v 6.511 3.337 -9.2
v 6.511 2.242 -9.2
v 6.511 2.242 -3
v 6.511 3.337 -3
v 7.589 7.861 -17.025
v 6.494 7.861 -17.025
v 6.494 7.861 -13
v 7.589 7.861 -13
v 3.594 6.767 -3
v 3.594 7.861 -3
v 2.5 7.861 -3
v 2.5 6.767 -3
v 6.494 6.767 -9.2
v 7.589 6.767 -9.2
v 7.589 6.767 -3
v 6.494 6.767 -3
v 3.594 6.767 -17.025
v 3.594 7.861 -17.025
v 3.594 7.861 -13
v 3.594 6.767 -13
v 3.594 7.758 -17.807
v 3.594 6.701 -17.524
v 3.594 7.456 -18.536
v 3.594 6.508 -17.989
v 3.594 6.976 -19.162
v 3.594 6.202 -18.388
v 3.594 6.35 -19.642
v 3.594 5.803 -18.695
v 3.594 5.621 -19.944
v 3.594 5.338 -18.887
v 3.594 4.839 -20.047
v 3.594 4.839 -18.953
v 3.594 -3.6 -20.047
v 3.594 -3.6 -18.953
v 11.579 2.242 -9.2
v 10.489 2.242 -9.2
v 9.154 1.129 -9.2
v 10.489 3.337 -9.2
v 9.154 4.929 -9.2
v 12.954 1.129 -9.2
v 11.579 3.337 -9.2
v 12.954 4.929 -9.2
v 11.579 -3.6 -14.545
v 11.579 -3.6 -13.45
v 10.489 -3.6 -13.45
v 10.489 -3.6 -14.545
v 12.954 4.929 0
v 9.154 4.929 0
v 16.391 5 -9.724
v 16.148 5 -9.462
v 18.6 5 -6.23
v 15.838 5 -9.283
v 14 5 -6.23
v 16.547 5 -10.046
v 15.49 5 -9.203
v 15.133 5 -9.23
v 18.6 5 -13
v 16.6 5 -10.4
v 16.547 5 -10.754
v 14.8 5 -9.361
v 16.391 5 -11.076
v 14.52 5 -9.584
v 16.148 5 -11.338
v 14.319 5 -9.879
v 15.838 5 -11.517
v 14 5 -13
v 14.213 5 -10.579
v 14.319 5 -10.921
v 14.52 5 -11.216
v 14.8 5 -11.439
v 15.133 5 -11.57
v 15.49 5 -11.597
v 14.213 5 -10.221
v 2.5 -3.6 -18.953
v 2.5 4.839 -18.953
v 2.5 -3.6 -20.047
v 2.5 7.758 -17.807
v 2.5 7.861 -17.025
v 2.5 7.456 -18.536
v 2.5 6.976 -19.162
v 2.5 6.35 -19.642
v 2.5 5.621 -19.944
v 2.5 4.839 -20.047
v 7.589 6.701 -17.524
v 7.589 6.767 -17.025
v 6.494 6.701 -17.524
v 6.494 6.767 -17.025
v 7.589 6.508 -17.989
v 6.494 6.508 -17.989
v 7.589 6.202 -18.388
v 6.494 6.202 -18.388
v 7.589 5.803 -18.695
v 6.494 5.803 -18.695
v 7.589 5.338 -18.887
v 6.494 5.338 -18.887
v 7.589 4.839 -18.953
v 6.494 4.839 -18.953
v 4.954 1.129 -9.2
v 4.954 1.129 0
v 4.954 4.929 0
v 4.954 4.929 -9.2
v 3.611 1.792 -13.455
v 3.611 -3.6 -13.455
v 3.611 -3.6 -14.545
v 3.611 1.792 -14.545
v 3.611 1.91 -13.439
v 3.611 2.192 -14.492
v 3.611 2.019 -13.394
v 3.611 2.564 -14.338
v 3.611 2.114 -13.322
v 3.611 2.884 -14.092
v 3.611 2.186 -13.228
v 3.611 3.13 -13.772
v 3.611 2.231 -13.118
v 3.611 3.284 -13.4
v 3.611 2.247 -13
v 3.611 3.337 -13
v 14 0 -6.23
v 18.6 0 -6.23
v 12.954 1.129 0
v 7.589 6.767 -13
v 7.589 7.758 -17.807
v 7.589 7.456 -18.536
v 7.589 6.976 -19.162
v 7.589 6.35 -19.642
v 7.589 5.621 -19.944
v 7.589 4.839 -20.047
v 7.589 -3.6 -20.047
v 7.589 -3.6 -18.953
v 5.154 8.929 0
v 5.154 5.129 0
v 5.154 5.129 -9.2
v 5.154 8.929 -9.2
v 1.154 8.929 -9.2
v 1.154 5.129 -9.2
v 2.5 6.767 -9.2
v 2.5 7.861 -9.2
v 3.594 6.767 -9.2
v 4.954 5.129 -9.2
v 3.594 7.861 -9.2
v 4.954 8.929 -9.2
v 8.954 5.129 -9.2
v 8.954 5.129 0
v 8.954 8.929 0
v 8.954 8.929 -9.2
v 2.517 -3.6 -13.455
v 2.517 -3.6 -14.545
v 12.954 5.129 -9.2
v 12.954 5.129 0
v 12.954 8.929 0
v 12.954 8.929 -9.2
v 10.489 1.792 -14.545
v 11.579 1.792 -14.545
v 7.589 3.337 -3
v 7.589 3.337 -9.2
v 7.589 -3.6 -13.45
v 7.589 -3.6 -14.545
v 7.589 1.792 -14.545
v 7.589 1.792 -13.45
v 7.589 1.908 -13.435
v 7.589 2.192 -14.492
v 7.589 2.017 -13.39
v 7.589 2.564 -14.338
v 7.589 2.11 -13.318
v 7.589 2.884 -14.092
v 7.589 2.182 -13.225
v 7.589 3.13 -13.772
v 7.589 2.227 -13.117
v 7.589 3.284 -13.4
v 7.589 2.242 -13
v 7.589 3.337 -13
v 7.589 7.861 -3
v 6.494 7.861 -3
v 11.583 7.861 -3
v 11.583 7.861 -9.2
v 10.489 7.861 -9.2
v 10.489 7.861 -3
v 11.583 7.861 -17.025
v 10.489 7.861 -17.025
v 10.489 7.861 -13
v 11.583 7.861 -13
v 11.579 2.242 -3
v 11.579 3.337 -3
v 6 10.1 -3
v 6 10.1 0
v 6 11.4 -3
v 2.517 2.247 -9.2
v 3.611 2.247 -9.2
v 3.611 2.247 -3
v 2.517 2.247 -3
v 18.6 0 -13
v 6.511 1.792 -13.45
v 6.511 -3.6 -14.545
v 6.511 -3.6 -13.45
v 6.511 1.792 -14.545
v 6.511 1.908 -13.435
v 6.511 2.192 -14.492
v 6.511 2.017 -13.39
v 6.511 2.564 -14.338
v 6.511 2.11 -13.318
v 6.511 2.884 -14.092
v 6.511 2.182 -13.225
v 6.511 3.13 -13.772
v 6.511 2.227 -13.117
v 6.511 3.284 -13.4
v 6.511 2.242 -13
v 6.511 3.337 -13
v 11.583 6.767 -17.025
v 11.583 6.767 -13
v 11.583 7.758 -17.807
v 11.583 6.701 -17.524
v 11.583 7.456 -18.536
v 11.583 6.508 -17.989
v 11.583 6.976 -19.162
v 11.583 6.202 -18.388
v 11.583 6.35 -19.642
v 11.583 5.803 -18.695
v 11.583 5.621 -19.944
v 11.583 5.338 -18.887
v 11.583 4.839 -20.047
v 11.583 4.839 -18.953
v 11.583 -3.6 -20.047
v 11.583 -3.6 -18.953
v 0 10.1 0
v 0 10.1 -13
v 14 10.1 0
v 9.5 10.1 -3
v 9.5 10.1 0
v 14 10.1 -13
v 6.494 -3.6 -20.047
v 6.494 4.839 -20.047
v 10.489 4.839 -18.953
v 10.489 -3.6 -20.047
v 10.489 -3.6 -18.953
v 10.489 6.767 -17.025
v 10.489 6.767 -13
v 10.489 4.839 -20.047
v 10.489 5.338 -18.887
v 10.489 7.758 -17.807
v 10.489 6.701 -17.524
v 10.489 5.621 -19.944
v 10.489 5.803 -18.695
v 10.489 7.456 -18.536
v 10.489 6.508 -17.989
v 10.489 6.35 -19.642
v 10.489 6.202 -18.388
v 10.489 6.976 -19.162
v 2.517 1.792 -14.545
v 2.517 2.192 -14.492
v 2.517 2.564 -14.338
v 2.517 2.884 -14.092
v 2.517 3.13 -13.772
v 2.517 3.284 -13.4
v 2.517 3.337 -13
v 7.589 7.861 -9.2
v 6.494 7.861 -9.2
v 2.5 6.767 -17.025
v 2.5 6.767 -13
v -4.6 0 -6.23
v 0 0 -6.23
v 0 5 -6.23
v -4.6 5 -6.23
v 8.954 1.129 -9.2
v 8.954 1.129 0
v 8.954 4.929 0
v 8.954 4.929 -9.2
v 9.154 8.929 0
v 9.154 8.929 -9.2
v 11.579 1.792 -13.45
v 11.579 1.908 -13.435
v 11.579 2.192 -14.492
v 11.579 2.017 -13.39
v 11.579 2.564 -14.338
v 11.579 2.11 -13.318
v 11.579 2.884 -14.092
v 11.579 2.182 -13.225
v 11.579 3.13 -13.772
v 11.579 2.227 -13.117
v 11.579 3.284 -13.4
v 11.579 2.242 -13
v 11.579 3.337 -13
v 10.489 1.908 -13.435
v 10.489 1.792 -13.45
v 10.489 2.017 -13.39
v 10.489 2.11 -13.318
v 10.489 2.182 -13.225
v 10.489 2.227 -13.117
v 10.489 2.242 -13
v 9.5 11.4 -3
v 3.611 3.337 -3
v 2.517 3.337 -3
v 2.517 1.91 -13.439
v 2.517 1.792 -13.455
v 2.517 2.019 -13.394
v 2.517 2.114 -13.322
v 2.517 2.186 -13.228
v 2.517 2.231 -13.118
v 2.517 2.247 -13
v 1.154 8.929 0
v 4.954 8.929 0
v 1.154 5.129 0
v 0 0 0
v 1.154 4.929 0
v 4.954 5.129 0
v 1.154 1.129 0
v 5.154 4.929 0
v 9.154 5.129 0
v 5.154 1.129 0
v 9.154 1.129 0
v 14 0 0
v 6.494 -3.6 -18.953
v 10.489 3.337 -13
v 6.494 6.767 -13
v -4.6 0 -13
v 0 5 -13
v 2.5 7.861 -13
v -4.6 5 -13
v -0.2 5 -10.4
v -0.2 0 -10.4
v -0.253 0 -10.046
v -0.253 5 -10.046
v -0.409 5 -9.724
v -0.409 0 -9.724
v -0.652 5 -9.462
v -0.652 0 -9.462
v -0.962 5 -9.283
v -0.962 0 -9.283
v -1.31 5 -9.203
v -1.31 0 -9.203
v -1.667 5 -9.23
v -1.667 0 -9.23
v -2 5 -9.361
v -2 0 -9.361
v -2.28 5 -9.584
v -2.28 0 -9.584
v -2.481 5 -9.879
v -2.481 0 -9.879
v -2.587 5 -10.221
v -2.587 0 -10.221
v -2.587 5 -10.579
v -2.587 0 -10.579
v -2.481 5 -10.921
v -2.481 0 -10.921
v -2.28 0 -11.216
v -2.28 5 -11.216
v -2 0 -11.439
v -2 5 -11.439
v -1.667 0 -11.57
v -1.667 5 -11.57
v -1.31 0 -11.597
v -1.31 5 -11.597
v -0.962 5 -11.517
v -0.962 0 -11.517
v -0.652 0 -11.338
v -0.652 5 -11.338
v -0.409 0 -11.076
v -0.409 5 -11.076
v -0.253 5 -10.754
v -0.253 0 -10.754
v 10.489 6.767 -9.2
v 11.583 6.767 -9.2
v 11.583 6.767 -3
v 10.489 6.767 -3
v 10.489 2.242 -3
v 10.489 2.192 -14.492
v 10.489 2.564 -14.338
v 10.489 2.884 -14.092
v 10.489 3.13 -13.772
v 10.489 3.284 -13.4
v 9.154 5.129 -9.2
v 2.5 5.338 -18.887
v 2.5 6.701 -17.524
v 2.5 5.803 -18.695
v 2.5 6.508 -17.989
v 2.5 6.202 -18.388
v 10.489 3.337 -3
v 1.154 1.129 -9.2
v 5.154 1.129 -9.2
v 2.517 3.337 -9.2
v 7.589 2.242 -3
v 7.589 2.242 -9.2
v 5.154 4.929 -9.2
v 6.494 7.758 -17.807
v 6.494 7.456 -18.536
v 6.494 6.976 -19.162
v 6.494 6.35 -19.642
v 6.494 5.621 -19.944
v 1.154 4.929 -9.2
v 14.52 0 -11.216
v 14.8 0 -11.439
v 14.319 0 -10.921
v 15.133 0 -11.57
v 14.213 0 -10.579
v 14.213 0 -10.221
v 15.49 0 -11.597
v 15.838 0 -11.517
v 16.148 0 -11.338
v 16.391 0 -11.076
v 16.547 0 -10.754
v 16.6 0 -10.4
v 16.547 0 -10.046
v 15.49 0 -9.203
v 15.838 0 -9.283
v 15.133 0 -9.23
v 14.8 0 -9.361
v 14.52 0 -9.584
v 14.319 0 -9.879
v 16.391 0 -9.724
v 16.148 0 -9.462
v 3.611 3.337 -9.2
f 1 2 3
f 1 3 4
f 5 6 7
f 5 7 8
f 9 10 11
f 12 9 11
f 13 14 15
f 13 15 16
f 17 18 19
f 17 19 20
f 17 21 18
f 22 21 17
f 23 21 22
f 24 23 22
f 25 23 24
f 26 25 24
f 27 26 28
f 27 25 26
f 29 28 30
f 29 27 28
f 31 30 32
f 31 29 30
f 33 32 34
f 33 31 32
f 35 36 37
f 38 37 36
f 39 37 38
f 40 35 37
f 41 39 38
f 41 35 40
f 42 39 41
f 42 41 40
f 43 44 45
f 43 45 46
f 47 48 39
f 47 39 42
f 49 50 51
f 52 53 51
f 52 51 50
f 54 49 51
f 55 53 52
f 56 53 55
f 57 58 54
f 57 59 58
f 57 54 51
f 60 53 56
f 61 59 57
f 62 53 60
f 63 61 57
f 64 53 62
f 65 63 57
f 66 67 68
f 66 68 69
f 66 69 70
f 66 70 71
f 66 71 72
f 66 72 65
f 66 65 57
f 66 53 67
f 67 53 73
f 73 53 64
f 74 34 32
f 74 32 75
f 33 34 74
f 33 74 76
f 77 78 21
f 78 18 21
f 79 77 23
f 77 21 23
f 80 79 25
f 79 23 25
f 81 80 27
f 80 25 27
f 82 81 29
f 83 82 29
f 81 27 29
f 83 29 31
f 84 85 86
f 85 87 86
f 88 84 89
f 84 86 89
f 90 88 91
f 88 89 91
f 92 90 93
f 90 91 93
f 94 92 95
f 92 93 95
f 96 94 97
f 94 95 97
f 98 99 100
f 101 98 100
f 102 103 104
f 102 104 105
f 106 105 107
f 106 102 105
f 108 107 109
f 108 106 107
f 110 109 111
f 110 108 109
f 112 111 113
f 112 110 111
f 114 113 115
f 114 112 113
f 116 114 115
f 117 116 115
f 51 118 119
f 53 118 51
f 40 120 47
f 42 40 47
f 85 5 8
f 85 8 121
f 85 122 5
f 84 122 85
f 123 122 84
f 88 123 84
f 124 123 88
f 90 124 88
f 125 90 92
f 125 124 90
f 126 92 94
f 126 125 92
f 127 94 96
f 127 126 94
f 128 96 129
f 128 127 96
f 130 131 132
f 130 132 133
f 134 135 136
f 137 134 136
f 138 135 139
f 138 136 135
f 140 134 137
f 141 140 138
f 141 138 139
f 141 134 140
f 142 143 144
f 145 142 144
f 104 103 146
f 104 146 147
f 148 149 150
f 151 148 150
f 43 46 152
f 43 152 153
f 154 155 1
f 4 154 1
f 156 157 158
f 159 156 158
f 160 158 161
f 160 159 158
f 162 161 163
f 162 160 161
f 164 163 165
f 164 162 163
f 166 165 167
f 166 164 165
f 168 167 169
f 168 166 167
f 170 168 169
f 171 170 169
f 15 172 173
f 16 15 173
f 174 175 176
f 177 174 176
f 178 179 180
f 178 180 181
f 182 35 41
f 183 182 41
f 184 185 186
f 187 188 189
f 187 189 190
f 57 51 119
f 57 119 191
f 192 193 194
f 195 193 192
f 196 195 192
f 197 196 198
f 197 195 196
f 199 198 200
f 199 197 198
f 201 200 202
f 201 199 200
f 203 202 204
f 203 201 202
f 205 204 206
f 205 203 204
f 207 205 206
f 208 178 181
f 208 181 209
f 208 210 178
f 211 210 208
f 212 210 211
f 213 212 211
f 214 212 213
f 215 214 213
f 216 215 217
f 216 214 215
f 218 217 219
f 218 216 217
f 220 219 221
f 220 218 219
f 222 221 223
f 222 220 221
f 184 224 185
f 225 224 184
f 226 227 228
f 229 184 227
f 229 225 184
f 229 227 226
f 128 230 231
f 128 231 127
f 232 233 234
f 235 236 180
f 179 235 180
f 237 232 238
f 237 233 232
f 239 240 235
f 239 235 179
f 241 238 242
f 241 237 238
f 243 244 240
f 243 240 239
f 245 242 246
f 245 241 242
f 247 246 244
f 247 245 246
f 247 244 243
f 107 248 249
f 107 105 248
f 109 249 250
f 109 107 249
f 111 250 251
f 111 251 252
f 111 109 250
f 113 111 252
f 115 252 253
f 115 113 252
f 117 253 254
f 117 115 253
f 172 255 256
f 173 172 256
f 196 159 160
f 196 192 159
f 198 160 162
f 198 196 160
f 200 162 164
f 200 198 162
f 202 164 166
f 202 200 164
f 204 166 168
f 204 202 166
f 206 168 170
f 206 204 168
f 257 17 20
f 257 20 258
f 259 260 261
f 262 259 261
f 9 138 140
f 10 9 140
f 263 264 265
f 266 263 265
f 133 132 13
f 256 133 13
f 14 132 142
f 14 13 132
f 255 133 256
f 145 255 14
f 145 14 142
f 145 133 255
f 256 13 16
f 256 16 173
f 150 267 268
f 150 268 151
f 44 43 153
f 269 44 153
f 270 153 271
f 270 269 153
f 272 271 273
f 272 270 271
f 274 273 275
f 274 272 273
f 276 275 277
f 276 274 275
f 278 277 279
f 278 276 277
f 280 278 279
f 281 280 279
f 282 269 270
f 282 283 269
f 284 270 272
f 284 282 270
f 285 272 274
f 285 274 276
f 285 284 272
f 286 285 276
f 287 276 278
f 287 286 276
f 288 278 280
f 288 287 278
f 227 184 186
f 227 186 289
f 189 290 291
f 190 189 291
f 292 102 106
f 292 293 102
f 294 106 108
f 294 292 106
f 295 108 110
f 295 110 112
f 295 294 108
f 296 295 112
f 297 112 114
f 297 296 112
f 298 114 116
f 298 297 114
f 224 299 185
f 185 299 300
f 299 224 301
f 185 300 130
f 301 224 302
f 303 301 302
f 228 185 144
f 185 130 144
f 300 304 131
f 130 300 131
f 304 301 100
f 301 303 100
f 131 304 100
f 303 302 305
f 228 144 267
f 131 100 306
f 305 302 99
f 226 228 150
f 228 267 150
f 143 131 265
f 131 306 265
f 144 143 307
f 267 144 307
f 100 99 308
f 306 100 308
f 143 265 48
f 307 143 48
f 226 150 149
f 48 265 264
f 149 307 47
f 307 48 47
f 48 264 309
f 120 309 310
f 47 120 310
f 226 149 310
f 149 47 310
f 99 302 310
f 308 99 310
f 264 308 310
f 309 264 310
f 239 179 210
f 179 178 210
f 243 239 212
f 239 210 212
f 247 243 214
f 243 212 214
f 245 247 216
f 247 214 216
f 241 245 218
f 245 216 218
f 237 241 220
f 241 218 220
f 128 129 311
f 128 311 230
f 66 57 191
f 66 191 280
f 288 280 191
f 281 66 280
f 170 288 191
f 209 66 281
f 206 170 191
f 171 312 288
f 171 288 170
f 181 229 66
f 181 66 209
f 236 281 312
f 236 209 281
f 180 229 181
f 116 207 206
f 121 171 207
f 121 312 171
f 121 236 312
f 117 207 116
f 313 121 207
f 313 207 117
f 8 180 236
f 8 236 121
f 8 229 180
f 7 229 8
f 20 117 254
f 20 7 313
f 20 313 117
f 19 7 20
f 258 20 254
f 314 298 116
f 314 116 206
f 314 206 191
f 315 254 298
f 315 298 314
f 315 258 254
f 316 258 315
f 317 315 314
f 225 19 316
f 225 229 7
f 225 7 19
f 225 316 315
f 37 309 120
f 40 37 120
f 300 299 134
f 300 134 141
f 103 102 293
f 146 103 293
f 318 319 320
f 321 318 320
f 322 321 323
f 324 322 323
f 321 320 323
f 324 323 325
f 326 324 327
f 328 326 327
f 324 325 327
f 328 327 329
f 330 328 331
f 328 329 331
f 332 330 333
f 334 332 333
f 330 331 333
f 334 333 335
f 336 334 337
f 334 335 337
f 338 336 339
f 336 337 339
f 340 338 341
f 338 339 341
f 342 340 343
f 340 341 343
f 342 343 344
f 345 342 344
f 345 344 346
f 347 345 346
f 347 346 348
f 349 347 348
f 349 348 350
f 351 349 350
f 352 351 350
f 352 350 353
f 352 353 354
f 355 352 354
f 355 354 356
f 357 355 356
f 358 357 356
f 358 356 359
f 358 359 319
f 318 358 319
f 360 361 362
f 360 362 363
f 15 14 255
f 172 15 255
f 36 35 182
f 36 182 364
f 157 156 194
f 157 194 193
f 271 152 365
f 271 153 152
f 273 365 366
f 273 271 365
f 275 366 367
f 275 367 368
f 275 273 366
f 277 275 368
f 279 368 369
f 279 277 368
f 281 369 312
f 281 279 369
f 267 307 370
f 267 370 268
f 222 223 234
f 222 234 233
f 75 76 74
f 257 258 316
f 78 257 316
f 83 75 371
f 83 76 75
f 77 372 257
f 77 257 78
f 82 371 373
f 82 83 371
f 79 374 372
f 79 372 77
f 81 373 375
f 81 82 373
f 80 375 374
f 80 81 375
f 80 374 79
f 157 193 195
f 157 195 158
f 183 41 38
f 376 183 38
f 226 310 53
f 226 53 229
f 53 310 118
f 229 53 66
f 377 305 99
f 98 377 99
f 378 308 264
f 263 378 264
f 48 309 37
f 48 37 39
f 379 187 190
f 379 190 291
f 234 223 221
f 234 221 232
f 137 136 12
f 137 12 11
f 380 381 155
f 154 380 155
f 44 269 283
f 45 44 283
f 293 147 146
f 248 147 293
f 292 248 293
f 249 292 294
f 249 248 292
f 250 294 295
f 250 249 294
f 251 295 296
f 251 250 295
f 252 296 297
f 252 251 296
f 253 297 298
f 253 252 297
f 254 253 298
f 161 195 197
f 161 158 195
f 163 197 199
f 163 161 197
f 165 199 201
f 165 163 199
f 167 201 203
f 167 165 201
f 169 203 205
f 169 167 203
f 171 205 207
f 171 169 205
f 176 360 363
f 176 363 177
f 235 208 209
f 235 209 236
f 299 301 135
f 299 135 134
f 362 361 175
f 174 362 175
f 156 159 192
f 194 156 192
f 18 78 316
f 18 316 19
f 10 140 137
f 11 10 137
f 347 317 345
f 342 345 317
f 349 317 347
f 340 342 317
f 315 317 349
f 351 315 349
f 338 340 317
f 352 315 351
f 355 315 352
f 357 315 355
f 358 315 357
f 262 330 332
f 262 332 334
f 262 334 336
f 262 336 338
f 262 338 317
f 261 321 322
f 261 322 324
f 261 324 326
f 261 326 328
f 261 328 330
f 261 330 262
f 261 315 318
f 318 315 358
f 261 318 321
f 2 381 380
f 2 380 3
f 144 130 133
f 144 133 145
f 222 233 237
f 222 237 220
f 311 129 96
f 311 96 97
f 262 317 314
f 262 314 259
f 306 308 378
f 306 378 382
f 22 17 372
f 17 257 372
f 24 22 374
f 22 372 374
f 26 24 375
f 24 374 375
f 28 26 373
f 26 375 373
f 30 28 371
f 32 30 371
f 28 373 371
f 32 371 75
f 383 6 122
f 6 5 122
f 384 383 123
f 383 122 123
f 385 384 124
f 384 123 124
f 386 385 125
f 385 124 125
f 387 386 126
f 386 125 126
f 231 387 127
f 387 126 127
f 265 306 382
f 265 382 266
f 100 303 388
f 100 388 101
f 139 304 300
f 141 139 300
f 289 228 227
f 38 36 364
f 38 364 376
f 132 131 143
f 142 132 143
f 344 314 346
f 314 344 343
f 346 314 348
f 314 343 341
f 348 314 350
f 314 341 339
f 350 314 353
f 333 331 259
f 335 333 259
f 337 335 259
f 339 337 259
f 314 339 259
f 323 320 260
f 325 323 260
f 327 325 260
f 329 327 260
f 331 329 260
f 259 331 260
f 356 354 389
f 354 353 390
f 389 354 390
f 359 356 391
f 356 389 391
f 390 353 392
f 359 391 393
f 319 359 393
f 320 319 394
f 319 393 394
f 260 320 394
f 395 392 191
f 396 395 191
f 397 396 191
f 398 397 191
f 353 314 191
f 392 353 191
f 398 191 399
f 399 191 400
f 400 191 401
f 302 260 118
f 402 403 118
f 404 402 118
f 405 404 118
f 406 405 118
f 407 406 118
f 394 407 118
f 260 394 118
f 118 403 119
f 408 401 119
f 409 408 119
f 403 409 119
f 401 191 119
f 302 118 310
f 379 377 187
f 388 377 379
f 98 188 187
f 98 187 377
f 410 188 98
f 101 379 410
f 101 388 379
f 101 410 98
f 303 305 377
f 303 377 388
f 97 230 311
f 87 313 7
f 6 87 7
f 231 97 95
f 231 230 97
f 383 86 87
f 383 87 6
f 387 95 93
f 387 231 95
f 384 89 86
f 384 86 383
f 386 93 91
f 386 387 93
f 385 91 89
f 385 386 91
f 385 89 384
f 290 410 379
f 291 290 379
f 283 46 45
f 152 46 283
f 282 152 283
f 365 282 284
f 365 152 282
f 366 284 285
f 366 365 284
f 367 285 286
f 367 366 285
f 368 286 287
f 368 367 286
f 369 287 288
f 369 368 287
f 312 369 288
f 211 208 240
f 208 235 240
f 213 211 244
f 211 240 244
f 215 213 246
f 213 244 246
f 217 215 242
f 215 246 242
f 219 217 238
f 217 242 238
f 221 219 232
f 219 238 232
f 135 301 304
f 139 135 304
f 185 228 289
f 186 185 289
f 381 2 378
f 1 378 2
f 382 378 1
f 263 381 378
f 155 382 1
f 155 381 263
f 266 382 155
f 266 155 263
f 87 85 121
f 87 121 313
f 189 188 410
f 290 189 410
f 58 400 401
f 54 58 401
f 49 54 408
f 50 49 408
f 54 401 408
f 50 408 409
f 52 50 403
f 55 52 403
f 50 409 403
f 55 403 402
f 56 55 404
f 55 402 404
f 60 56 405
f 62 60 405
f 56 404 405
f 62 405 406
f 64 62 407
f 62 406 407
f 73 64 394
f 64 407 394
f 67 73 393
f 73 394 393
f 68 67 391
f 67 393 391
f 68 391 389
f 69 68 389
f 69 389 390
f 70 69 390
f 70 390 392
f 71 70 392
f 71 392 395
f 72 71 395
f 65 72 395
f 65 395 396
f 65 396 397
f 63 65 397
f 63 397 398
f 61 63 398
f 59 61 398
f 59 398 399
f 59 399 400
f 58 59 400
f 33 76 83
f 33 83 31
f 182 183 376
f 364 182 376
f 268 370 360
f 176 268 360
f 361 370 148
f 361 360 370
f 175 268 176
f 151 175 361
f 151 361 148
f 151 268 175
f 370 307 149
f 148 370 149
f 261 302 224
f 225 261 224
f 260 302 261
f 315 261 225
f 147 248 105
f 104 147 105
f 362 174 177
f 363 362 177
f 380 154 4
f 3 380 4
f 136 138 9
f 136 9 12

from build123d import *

# Parameters (mm, degrees)
SKETCH1_W           = 14
SKETCH1_H           = 13
BOSS_EXTRUDE1_DEPTH = 10.1
SKETCH2_W           = 3.5
SKETCH2_H           = 3
BOSS_EXTRUDE2_DEPTH = 1.3
CUT_EXTRUDE1_REACH  = 21.728
SKETCH4_W           = 6.77
SKETCH4_H           = 5
BOSS_EXTRUDE3_DEPTH = 4.6
SKETCH5_W           = 6.77
SKETCH5_H           = 5
BOSS_EXTRUDE4_DEPTH = 4.6
SKETCH6_W           = 3.8
SKETCH6_H           = 3.8
CUT_EXTRUDE2_DEPTH  = 9.2
SKETCH7_W           = 1.094306831
SKETCH7_H           = 1.09430683
SKETCH7_W_2         = 1.09430683
BOSS_EXTRUDE5_DEPTH = 10
SKETCH7_4_W         = 1.094306831
SKETCH7_4_H         = 1.09430683
SKETCH7_4_W_2       = 1.09430683
SKETCH10_W          = 1.09430683
SKETCH10_H          = 1.09
SKETCH10_W_2        = 1.077227458
SKETCH10_H_2        = 1.094306831
SKETCH10_W_3        = 1.09
SKETCH10_2_W        = 1.09430683
SKETCH10_2_H        = 1.09
SKETCH10_2_W_2      = 1.077227458
SKETCH10_2_H_2      = 1.094306831
SKETCH10_2_W_3      = 1.09
BOSS_EXTRUDE6_DEPTH = 10
SKETCH12_R          = 1.2
CUT_EXTRUDE3_DEPTH  = 30.627830836


with BuildPart() as part:
    # Sketch1 → Boss-Extrude1 (new body)
    with BuildSketch(Plane(origin=(0, 0, 0), x_dir=(1, 0, 0), z_dir=(0, 1, 0))):
        with Locations((7, 6.5)):
            Rectangle(SKETCH1_W, SKETCH1_H)
    extrude(amount=BOSS_EXTRUDE1_DEPTH)

    # Sketch2 → Boss-Extrude2 (add)
    with BuildSketch(Plane(origin=(0, 10.1, 0), x_dir=(1, 0, 0), z_dir=(0, 1, 0))):
        with Locations((7.75, 1.5)):
            Rectangle(SKETCH2_W, SKETCH2_H)
    extrude(amount=BOSS_EXTRUDE2_DEPTH)

    # Sketch3 → Cut-Extrude1 (cut, up to next)
    with BuildSketch(Plane(origin=(9.5, 0, 0), x_dir=(0, 0, -1), z_dir=(1, 0, 0)), mode=Mode.PRIVATE) as cut_extrude1_sk1:
        Polygon((0, 10.1), (3, 11.4), (0, 11.4), align=None)
    cut_extrude1_tool1 = extrude(cut_extrude1_sk1.sketch, amount=-CUT_EXTRUDE1_REACH, mode=Mode.PRIVATE) & part.part
    add(cut_extrude1_tool1.solids().sort_by_distance((9.5, 10.966667, -1))[0], mode=Mode.SUBTRACT)

    # Sketch4 → Boss-Extrude3 (add)
    with BuildSketch(Plane(origin=(14, 0, 0), x_dir=(0, 0, -1), z_dir=(1, 0, 0))):
        with Locations((9.615, 2.5)):
            Rectangle(SKETCH4_W, SKETCH4_H)
    extrude(amount=BOSS_EXTRUDE3_DEPTH)

    # Sketch5 → Boss-Extrude4 (add)
    with BuildSketch(Plane.ZY):
        with Locations((-9.615, 2.5)):
            Rectangle(SKETCH5_W, SKETCH5_H)
    extrude(amount=BOSS_EXTRUDE4_DEPTH)

    # Sketch6 → Cut-Extrude2 (cut)
    with BuildSketch(Plane.XY):
        with Locations((3.054030332, 7.029063078)):
            Rectangle(SKETCH6_W, SKETCH6_H)
        with Locations((11.054030332, 3.029063078)):
            Rectangle(SKETCH6_W, SKETCH6_H)
        with Locations((11.054030332, 7.029063078)):
            Rectangle(SKETCH6_W, SKETCH6_H)
        with Locations((3.054030332, 3.029063078)):
            Rectangle(SKETCH6_W, SKETCH6_H)
        with Locations((7.054030332, 7.029063078)):
            Rectangle(SKETCH6_W, SKETCH6_H)
        with Locations((7.054030332, 3.029063078)):
            Rectangle(SKETCH6_W, SKETCH6_H)
    extrude(amount=-CUT_EXTRUDE2_DEPTH, mode=Mode.SUBTRACT)

    # Sketch7 → Boss-Extrude5 (add)
    with BuildSketch(Plane(origin=(0, 0, -13), x_dir=(-1, 0, 0), z_dir=(0, 0, -1))):
        with Locations((-11.035767077, 7.313802256)):
            Rectangle(SKETCH7_W, SKETCH7_H)
        with Locations((-7.041460246, 7.313802256)):
            Rectangle(SKETCH7_W_2, SKETCH7_H)
        with Locations((-3.047153416, 7.313802256)):
            Rectangle(SKETCH7_W, SKETCH7_H)
    extrude(amount=-BOSS_EXTRUDE5_DEPTH)

    # Sweep2: sweep along a path in Sketch8
    with BuildLine(Plane(origin=(4, 0, 0), x_dir=(0, 0, -1), z_dir=(1, 0, 0))) as sweep2_path:
        Line((13, 7.313802256), (17.025339082, 7.313802256))
        ThreePointArc((17.025339082, 7.313802256), (18.775188598, 6.588990854), (19.5, 4.839141338))
        Line((19.5, 4.839141338), (19.5, 0))
        Line((19.5, 0), (19.5, -3.6))
    # Sketch7<4> → Sweep2 (sweep)
    with BuildSketch(Plane(origin=(0, 0, -13), x_dir=(-1, 0, 0), z_dir=(0, 0, -1))):
        with Locations((-11.035767077, 7.313802256)):
            Rectangle(SKETCH7_4_W, SKETCH7_4_H)
        with Locations((-7.041460246, 7.313802256)):
            Rectangle(SKETCH7_4_W_2, SKETCH7_4_H)
        with Locations((-3.047153416, 7.313802256)):
            Rectangle(SKETCH7_4_W, SKETCH7_4_H)
    sweep(path=sweep2_path.line)

    # Sweep3: sweep along a path in Sketch11
    with BuildLine(Plane(origin=(4, 0, 0), x_dir=(0, 0, -1), z_dir=(1, 0, 0))) as sweep3_path:
        Line((14, -3.6), (14, 0))
        Line((14, 0), (14, 1.79191881))
        ThreePointArc((14, 1.79191881), (13.707106781, 2.499025591), (13, 2.79191881))
    # Sketch10 → Sweep3 (sweep)
    with BuildSketch(Plane(origin=(0, 0, -13), x_dir=(-1, 0, 0), z_dir=(0, 0, -1))):
        with Locations((-3.0642338, 2.79191881)):
            Rectangle(SKETCH10_W, SKETCH10_H)
        with Locations((-7.049999932, 2.789495426)):
            Rectangle(SKETCH10_W_2, SKETCH10_H_2)
        with Locations((-11.033613661, 2.789495426)):
            Rectangle(SKETCH10_W_3, SKETCH10_H_2)
    sweep(path=sweep3_path.line)

    # Sketch10<2> → Boss-Extrude6 (add)
    with BuildSketch(Plane(origin=(0, 0, -13), x_dir=(-1, 0, 0), z_dir=(0, 0, -1))):
        with Locations((-3.0642338, 2.79191881)):
            Rectangle(SKETCH10_2_W, SKETCH10_2_H)
        with Locations((-7.049999932, 2.789495426)):
            Rectangle(SKETCH10_2_W_2, SKETCH10_2_H_2)
        with Locations((-11.033613661, 2.789495426)):
            Rectangle(SKETCH10_2_W_3, SKETCH10_2_H_2)
    extrude(amount=-BOSS_EXTRUDE6_DEPTH)

    # Sketch12 → Cut-Extrude3 (cut, through all)
    with BuildSketch(Plane.XZ):
        with Locations((-1.4, -10.4)):
            Circle(SKETCH12_R)
        with Locations((15.4, -10.4)):
            Circle(SKETCH12_R)
    extrude(amount=-CUT_EXTRUDE3_DEPTH, mode=Mode.SUBTRACT)


solid = part.part
